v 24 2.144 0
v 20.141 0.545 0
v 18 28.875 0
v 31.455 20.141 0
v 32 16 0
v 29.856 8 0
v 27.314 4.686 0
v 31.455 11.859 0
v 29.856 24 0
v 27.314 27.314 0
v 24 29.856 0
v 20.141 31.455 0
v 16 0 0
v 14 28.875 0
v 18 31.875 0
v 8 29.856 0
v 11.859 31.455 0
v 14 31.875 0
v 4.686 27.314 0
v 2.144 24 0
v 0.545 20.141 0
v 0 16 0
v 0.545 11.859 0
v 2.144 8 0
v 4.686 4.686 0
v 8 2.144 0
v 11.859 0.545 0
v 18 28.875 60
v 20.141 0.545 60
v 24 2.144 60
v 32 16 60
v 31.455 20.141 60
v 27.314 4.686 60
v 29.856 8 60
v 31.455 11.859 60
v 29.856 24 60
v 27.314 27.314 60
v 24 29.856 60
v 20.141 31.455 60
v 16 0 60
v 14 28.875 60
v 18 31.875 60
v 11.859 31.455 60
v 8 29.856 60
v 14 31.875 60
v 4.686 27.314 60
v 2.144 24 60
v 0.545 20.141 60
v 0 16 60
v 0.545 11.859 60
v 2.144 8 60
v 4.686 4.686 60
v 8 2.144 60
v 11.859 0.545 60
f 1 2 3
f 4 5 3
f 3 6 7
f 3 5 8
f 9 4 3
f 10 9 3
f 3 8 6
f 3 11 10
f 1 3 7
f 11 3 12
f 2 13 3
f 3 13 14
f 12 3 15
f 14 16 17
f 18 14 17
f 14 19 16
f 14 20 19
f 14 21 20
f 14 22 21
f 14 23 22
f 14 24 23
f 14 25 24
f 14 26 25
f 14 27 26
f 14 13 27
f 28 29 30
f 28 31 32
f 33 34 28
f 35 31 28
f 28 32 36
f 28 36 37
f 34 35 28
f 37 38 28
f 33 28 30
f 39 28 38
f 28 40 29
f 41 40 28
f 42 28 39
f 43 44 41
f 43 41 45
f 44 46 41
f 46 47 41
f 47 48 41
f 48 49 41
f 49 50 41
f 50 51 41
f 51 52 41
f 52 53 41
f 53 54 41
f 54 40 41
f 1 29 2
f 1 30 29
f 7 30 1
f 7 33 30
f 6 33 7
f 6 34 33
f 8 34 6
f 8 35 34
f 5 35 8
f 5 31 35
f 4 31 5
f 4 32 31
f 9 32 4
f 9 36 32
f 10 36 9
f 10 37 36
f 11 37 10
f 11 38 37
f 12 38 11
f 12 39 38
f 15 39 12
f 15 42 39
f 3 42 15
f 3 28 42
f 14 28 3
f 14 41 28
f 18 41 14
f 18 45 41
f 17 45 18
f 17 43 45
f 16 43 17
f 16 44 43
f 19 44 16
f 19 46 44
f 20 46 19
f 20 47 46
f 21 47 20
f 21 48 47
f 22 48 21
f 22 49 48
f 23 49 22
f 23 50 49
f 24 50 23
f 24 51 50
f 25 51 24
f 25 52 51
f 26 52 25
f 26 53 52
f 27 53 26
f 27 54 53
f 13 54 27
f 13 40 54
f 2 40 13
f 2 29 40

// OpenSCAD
$fn = 32;

// ----------------------------------------------------------------------
// Keyway shaft: d32 shaft, key 4 x 3 mm
// ----------------------------------------------------------------------

// --- parameters (mm) ---
shaft_r = 16;             // shaft radius
key_w = 4;                // keyway width
key_d = 3;                // keyway depth below the surface line
plate_t = 60;             // shaft length, Z (extrusion height)

shaft_d = 2 * shaft_r;  // shaft diameter
circle_step = 15;  // polygon sampling step, degrees

profile = [[11.859, 31.455], [8, 29.856], [4.686, 27.314], [2.144, 24], [0.545, 20.141], [0, 16], [0.545, 11.859], [2.144, 8], [4.686, 4.686], [8, 2.144], [11.859, 0.545], [16, 0], [20.141, 0.545], [24, 2.144], [27.314, 4.686], [29.856, 8], [31.455, 11.859], [32, 16], [31.455, 20.141], [29.856, 24], [27.314, 27.314], [24, 29.856], [20.141, 31.455], [18, 31.875], [18, 28.875], [14, 28.875], [14, 31.875]];  // primary outline, 27 points, counter clockwise

// --- the one profile operation ---
linear_extrude(height = plate_t) polygon(points = profile);
